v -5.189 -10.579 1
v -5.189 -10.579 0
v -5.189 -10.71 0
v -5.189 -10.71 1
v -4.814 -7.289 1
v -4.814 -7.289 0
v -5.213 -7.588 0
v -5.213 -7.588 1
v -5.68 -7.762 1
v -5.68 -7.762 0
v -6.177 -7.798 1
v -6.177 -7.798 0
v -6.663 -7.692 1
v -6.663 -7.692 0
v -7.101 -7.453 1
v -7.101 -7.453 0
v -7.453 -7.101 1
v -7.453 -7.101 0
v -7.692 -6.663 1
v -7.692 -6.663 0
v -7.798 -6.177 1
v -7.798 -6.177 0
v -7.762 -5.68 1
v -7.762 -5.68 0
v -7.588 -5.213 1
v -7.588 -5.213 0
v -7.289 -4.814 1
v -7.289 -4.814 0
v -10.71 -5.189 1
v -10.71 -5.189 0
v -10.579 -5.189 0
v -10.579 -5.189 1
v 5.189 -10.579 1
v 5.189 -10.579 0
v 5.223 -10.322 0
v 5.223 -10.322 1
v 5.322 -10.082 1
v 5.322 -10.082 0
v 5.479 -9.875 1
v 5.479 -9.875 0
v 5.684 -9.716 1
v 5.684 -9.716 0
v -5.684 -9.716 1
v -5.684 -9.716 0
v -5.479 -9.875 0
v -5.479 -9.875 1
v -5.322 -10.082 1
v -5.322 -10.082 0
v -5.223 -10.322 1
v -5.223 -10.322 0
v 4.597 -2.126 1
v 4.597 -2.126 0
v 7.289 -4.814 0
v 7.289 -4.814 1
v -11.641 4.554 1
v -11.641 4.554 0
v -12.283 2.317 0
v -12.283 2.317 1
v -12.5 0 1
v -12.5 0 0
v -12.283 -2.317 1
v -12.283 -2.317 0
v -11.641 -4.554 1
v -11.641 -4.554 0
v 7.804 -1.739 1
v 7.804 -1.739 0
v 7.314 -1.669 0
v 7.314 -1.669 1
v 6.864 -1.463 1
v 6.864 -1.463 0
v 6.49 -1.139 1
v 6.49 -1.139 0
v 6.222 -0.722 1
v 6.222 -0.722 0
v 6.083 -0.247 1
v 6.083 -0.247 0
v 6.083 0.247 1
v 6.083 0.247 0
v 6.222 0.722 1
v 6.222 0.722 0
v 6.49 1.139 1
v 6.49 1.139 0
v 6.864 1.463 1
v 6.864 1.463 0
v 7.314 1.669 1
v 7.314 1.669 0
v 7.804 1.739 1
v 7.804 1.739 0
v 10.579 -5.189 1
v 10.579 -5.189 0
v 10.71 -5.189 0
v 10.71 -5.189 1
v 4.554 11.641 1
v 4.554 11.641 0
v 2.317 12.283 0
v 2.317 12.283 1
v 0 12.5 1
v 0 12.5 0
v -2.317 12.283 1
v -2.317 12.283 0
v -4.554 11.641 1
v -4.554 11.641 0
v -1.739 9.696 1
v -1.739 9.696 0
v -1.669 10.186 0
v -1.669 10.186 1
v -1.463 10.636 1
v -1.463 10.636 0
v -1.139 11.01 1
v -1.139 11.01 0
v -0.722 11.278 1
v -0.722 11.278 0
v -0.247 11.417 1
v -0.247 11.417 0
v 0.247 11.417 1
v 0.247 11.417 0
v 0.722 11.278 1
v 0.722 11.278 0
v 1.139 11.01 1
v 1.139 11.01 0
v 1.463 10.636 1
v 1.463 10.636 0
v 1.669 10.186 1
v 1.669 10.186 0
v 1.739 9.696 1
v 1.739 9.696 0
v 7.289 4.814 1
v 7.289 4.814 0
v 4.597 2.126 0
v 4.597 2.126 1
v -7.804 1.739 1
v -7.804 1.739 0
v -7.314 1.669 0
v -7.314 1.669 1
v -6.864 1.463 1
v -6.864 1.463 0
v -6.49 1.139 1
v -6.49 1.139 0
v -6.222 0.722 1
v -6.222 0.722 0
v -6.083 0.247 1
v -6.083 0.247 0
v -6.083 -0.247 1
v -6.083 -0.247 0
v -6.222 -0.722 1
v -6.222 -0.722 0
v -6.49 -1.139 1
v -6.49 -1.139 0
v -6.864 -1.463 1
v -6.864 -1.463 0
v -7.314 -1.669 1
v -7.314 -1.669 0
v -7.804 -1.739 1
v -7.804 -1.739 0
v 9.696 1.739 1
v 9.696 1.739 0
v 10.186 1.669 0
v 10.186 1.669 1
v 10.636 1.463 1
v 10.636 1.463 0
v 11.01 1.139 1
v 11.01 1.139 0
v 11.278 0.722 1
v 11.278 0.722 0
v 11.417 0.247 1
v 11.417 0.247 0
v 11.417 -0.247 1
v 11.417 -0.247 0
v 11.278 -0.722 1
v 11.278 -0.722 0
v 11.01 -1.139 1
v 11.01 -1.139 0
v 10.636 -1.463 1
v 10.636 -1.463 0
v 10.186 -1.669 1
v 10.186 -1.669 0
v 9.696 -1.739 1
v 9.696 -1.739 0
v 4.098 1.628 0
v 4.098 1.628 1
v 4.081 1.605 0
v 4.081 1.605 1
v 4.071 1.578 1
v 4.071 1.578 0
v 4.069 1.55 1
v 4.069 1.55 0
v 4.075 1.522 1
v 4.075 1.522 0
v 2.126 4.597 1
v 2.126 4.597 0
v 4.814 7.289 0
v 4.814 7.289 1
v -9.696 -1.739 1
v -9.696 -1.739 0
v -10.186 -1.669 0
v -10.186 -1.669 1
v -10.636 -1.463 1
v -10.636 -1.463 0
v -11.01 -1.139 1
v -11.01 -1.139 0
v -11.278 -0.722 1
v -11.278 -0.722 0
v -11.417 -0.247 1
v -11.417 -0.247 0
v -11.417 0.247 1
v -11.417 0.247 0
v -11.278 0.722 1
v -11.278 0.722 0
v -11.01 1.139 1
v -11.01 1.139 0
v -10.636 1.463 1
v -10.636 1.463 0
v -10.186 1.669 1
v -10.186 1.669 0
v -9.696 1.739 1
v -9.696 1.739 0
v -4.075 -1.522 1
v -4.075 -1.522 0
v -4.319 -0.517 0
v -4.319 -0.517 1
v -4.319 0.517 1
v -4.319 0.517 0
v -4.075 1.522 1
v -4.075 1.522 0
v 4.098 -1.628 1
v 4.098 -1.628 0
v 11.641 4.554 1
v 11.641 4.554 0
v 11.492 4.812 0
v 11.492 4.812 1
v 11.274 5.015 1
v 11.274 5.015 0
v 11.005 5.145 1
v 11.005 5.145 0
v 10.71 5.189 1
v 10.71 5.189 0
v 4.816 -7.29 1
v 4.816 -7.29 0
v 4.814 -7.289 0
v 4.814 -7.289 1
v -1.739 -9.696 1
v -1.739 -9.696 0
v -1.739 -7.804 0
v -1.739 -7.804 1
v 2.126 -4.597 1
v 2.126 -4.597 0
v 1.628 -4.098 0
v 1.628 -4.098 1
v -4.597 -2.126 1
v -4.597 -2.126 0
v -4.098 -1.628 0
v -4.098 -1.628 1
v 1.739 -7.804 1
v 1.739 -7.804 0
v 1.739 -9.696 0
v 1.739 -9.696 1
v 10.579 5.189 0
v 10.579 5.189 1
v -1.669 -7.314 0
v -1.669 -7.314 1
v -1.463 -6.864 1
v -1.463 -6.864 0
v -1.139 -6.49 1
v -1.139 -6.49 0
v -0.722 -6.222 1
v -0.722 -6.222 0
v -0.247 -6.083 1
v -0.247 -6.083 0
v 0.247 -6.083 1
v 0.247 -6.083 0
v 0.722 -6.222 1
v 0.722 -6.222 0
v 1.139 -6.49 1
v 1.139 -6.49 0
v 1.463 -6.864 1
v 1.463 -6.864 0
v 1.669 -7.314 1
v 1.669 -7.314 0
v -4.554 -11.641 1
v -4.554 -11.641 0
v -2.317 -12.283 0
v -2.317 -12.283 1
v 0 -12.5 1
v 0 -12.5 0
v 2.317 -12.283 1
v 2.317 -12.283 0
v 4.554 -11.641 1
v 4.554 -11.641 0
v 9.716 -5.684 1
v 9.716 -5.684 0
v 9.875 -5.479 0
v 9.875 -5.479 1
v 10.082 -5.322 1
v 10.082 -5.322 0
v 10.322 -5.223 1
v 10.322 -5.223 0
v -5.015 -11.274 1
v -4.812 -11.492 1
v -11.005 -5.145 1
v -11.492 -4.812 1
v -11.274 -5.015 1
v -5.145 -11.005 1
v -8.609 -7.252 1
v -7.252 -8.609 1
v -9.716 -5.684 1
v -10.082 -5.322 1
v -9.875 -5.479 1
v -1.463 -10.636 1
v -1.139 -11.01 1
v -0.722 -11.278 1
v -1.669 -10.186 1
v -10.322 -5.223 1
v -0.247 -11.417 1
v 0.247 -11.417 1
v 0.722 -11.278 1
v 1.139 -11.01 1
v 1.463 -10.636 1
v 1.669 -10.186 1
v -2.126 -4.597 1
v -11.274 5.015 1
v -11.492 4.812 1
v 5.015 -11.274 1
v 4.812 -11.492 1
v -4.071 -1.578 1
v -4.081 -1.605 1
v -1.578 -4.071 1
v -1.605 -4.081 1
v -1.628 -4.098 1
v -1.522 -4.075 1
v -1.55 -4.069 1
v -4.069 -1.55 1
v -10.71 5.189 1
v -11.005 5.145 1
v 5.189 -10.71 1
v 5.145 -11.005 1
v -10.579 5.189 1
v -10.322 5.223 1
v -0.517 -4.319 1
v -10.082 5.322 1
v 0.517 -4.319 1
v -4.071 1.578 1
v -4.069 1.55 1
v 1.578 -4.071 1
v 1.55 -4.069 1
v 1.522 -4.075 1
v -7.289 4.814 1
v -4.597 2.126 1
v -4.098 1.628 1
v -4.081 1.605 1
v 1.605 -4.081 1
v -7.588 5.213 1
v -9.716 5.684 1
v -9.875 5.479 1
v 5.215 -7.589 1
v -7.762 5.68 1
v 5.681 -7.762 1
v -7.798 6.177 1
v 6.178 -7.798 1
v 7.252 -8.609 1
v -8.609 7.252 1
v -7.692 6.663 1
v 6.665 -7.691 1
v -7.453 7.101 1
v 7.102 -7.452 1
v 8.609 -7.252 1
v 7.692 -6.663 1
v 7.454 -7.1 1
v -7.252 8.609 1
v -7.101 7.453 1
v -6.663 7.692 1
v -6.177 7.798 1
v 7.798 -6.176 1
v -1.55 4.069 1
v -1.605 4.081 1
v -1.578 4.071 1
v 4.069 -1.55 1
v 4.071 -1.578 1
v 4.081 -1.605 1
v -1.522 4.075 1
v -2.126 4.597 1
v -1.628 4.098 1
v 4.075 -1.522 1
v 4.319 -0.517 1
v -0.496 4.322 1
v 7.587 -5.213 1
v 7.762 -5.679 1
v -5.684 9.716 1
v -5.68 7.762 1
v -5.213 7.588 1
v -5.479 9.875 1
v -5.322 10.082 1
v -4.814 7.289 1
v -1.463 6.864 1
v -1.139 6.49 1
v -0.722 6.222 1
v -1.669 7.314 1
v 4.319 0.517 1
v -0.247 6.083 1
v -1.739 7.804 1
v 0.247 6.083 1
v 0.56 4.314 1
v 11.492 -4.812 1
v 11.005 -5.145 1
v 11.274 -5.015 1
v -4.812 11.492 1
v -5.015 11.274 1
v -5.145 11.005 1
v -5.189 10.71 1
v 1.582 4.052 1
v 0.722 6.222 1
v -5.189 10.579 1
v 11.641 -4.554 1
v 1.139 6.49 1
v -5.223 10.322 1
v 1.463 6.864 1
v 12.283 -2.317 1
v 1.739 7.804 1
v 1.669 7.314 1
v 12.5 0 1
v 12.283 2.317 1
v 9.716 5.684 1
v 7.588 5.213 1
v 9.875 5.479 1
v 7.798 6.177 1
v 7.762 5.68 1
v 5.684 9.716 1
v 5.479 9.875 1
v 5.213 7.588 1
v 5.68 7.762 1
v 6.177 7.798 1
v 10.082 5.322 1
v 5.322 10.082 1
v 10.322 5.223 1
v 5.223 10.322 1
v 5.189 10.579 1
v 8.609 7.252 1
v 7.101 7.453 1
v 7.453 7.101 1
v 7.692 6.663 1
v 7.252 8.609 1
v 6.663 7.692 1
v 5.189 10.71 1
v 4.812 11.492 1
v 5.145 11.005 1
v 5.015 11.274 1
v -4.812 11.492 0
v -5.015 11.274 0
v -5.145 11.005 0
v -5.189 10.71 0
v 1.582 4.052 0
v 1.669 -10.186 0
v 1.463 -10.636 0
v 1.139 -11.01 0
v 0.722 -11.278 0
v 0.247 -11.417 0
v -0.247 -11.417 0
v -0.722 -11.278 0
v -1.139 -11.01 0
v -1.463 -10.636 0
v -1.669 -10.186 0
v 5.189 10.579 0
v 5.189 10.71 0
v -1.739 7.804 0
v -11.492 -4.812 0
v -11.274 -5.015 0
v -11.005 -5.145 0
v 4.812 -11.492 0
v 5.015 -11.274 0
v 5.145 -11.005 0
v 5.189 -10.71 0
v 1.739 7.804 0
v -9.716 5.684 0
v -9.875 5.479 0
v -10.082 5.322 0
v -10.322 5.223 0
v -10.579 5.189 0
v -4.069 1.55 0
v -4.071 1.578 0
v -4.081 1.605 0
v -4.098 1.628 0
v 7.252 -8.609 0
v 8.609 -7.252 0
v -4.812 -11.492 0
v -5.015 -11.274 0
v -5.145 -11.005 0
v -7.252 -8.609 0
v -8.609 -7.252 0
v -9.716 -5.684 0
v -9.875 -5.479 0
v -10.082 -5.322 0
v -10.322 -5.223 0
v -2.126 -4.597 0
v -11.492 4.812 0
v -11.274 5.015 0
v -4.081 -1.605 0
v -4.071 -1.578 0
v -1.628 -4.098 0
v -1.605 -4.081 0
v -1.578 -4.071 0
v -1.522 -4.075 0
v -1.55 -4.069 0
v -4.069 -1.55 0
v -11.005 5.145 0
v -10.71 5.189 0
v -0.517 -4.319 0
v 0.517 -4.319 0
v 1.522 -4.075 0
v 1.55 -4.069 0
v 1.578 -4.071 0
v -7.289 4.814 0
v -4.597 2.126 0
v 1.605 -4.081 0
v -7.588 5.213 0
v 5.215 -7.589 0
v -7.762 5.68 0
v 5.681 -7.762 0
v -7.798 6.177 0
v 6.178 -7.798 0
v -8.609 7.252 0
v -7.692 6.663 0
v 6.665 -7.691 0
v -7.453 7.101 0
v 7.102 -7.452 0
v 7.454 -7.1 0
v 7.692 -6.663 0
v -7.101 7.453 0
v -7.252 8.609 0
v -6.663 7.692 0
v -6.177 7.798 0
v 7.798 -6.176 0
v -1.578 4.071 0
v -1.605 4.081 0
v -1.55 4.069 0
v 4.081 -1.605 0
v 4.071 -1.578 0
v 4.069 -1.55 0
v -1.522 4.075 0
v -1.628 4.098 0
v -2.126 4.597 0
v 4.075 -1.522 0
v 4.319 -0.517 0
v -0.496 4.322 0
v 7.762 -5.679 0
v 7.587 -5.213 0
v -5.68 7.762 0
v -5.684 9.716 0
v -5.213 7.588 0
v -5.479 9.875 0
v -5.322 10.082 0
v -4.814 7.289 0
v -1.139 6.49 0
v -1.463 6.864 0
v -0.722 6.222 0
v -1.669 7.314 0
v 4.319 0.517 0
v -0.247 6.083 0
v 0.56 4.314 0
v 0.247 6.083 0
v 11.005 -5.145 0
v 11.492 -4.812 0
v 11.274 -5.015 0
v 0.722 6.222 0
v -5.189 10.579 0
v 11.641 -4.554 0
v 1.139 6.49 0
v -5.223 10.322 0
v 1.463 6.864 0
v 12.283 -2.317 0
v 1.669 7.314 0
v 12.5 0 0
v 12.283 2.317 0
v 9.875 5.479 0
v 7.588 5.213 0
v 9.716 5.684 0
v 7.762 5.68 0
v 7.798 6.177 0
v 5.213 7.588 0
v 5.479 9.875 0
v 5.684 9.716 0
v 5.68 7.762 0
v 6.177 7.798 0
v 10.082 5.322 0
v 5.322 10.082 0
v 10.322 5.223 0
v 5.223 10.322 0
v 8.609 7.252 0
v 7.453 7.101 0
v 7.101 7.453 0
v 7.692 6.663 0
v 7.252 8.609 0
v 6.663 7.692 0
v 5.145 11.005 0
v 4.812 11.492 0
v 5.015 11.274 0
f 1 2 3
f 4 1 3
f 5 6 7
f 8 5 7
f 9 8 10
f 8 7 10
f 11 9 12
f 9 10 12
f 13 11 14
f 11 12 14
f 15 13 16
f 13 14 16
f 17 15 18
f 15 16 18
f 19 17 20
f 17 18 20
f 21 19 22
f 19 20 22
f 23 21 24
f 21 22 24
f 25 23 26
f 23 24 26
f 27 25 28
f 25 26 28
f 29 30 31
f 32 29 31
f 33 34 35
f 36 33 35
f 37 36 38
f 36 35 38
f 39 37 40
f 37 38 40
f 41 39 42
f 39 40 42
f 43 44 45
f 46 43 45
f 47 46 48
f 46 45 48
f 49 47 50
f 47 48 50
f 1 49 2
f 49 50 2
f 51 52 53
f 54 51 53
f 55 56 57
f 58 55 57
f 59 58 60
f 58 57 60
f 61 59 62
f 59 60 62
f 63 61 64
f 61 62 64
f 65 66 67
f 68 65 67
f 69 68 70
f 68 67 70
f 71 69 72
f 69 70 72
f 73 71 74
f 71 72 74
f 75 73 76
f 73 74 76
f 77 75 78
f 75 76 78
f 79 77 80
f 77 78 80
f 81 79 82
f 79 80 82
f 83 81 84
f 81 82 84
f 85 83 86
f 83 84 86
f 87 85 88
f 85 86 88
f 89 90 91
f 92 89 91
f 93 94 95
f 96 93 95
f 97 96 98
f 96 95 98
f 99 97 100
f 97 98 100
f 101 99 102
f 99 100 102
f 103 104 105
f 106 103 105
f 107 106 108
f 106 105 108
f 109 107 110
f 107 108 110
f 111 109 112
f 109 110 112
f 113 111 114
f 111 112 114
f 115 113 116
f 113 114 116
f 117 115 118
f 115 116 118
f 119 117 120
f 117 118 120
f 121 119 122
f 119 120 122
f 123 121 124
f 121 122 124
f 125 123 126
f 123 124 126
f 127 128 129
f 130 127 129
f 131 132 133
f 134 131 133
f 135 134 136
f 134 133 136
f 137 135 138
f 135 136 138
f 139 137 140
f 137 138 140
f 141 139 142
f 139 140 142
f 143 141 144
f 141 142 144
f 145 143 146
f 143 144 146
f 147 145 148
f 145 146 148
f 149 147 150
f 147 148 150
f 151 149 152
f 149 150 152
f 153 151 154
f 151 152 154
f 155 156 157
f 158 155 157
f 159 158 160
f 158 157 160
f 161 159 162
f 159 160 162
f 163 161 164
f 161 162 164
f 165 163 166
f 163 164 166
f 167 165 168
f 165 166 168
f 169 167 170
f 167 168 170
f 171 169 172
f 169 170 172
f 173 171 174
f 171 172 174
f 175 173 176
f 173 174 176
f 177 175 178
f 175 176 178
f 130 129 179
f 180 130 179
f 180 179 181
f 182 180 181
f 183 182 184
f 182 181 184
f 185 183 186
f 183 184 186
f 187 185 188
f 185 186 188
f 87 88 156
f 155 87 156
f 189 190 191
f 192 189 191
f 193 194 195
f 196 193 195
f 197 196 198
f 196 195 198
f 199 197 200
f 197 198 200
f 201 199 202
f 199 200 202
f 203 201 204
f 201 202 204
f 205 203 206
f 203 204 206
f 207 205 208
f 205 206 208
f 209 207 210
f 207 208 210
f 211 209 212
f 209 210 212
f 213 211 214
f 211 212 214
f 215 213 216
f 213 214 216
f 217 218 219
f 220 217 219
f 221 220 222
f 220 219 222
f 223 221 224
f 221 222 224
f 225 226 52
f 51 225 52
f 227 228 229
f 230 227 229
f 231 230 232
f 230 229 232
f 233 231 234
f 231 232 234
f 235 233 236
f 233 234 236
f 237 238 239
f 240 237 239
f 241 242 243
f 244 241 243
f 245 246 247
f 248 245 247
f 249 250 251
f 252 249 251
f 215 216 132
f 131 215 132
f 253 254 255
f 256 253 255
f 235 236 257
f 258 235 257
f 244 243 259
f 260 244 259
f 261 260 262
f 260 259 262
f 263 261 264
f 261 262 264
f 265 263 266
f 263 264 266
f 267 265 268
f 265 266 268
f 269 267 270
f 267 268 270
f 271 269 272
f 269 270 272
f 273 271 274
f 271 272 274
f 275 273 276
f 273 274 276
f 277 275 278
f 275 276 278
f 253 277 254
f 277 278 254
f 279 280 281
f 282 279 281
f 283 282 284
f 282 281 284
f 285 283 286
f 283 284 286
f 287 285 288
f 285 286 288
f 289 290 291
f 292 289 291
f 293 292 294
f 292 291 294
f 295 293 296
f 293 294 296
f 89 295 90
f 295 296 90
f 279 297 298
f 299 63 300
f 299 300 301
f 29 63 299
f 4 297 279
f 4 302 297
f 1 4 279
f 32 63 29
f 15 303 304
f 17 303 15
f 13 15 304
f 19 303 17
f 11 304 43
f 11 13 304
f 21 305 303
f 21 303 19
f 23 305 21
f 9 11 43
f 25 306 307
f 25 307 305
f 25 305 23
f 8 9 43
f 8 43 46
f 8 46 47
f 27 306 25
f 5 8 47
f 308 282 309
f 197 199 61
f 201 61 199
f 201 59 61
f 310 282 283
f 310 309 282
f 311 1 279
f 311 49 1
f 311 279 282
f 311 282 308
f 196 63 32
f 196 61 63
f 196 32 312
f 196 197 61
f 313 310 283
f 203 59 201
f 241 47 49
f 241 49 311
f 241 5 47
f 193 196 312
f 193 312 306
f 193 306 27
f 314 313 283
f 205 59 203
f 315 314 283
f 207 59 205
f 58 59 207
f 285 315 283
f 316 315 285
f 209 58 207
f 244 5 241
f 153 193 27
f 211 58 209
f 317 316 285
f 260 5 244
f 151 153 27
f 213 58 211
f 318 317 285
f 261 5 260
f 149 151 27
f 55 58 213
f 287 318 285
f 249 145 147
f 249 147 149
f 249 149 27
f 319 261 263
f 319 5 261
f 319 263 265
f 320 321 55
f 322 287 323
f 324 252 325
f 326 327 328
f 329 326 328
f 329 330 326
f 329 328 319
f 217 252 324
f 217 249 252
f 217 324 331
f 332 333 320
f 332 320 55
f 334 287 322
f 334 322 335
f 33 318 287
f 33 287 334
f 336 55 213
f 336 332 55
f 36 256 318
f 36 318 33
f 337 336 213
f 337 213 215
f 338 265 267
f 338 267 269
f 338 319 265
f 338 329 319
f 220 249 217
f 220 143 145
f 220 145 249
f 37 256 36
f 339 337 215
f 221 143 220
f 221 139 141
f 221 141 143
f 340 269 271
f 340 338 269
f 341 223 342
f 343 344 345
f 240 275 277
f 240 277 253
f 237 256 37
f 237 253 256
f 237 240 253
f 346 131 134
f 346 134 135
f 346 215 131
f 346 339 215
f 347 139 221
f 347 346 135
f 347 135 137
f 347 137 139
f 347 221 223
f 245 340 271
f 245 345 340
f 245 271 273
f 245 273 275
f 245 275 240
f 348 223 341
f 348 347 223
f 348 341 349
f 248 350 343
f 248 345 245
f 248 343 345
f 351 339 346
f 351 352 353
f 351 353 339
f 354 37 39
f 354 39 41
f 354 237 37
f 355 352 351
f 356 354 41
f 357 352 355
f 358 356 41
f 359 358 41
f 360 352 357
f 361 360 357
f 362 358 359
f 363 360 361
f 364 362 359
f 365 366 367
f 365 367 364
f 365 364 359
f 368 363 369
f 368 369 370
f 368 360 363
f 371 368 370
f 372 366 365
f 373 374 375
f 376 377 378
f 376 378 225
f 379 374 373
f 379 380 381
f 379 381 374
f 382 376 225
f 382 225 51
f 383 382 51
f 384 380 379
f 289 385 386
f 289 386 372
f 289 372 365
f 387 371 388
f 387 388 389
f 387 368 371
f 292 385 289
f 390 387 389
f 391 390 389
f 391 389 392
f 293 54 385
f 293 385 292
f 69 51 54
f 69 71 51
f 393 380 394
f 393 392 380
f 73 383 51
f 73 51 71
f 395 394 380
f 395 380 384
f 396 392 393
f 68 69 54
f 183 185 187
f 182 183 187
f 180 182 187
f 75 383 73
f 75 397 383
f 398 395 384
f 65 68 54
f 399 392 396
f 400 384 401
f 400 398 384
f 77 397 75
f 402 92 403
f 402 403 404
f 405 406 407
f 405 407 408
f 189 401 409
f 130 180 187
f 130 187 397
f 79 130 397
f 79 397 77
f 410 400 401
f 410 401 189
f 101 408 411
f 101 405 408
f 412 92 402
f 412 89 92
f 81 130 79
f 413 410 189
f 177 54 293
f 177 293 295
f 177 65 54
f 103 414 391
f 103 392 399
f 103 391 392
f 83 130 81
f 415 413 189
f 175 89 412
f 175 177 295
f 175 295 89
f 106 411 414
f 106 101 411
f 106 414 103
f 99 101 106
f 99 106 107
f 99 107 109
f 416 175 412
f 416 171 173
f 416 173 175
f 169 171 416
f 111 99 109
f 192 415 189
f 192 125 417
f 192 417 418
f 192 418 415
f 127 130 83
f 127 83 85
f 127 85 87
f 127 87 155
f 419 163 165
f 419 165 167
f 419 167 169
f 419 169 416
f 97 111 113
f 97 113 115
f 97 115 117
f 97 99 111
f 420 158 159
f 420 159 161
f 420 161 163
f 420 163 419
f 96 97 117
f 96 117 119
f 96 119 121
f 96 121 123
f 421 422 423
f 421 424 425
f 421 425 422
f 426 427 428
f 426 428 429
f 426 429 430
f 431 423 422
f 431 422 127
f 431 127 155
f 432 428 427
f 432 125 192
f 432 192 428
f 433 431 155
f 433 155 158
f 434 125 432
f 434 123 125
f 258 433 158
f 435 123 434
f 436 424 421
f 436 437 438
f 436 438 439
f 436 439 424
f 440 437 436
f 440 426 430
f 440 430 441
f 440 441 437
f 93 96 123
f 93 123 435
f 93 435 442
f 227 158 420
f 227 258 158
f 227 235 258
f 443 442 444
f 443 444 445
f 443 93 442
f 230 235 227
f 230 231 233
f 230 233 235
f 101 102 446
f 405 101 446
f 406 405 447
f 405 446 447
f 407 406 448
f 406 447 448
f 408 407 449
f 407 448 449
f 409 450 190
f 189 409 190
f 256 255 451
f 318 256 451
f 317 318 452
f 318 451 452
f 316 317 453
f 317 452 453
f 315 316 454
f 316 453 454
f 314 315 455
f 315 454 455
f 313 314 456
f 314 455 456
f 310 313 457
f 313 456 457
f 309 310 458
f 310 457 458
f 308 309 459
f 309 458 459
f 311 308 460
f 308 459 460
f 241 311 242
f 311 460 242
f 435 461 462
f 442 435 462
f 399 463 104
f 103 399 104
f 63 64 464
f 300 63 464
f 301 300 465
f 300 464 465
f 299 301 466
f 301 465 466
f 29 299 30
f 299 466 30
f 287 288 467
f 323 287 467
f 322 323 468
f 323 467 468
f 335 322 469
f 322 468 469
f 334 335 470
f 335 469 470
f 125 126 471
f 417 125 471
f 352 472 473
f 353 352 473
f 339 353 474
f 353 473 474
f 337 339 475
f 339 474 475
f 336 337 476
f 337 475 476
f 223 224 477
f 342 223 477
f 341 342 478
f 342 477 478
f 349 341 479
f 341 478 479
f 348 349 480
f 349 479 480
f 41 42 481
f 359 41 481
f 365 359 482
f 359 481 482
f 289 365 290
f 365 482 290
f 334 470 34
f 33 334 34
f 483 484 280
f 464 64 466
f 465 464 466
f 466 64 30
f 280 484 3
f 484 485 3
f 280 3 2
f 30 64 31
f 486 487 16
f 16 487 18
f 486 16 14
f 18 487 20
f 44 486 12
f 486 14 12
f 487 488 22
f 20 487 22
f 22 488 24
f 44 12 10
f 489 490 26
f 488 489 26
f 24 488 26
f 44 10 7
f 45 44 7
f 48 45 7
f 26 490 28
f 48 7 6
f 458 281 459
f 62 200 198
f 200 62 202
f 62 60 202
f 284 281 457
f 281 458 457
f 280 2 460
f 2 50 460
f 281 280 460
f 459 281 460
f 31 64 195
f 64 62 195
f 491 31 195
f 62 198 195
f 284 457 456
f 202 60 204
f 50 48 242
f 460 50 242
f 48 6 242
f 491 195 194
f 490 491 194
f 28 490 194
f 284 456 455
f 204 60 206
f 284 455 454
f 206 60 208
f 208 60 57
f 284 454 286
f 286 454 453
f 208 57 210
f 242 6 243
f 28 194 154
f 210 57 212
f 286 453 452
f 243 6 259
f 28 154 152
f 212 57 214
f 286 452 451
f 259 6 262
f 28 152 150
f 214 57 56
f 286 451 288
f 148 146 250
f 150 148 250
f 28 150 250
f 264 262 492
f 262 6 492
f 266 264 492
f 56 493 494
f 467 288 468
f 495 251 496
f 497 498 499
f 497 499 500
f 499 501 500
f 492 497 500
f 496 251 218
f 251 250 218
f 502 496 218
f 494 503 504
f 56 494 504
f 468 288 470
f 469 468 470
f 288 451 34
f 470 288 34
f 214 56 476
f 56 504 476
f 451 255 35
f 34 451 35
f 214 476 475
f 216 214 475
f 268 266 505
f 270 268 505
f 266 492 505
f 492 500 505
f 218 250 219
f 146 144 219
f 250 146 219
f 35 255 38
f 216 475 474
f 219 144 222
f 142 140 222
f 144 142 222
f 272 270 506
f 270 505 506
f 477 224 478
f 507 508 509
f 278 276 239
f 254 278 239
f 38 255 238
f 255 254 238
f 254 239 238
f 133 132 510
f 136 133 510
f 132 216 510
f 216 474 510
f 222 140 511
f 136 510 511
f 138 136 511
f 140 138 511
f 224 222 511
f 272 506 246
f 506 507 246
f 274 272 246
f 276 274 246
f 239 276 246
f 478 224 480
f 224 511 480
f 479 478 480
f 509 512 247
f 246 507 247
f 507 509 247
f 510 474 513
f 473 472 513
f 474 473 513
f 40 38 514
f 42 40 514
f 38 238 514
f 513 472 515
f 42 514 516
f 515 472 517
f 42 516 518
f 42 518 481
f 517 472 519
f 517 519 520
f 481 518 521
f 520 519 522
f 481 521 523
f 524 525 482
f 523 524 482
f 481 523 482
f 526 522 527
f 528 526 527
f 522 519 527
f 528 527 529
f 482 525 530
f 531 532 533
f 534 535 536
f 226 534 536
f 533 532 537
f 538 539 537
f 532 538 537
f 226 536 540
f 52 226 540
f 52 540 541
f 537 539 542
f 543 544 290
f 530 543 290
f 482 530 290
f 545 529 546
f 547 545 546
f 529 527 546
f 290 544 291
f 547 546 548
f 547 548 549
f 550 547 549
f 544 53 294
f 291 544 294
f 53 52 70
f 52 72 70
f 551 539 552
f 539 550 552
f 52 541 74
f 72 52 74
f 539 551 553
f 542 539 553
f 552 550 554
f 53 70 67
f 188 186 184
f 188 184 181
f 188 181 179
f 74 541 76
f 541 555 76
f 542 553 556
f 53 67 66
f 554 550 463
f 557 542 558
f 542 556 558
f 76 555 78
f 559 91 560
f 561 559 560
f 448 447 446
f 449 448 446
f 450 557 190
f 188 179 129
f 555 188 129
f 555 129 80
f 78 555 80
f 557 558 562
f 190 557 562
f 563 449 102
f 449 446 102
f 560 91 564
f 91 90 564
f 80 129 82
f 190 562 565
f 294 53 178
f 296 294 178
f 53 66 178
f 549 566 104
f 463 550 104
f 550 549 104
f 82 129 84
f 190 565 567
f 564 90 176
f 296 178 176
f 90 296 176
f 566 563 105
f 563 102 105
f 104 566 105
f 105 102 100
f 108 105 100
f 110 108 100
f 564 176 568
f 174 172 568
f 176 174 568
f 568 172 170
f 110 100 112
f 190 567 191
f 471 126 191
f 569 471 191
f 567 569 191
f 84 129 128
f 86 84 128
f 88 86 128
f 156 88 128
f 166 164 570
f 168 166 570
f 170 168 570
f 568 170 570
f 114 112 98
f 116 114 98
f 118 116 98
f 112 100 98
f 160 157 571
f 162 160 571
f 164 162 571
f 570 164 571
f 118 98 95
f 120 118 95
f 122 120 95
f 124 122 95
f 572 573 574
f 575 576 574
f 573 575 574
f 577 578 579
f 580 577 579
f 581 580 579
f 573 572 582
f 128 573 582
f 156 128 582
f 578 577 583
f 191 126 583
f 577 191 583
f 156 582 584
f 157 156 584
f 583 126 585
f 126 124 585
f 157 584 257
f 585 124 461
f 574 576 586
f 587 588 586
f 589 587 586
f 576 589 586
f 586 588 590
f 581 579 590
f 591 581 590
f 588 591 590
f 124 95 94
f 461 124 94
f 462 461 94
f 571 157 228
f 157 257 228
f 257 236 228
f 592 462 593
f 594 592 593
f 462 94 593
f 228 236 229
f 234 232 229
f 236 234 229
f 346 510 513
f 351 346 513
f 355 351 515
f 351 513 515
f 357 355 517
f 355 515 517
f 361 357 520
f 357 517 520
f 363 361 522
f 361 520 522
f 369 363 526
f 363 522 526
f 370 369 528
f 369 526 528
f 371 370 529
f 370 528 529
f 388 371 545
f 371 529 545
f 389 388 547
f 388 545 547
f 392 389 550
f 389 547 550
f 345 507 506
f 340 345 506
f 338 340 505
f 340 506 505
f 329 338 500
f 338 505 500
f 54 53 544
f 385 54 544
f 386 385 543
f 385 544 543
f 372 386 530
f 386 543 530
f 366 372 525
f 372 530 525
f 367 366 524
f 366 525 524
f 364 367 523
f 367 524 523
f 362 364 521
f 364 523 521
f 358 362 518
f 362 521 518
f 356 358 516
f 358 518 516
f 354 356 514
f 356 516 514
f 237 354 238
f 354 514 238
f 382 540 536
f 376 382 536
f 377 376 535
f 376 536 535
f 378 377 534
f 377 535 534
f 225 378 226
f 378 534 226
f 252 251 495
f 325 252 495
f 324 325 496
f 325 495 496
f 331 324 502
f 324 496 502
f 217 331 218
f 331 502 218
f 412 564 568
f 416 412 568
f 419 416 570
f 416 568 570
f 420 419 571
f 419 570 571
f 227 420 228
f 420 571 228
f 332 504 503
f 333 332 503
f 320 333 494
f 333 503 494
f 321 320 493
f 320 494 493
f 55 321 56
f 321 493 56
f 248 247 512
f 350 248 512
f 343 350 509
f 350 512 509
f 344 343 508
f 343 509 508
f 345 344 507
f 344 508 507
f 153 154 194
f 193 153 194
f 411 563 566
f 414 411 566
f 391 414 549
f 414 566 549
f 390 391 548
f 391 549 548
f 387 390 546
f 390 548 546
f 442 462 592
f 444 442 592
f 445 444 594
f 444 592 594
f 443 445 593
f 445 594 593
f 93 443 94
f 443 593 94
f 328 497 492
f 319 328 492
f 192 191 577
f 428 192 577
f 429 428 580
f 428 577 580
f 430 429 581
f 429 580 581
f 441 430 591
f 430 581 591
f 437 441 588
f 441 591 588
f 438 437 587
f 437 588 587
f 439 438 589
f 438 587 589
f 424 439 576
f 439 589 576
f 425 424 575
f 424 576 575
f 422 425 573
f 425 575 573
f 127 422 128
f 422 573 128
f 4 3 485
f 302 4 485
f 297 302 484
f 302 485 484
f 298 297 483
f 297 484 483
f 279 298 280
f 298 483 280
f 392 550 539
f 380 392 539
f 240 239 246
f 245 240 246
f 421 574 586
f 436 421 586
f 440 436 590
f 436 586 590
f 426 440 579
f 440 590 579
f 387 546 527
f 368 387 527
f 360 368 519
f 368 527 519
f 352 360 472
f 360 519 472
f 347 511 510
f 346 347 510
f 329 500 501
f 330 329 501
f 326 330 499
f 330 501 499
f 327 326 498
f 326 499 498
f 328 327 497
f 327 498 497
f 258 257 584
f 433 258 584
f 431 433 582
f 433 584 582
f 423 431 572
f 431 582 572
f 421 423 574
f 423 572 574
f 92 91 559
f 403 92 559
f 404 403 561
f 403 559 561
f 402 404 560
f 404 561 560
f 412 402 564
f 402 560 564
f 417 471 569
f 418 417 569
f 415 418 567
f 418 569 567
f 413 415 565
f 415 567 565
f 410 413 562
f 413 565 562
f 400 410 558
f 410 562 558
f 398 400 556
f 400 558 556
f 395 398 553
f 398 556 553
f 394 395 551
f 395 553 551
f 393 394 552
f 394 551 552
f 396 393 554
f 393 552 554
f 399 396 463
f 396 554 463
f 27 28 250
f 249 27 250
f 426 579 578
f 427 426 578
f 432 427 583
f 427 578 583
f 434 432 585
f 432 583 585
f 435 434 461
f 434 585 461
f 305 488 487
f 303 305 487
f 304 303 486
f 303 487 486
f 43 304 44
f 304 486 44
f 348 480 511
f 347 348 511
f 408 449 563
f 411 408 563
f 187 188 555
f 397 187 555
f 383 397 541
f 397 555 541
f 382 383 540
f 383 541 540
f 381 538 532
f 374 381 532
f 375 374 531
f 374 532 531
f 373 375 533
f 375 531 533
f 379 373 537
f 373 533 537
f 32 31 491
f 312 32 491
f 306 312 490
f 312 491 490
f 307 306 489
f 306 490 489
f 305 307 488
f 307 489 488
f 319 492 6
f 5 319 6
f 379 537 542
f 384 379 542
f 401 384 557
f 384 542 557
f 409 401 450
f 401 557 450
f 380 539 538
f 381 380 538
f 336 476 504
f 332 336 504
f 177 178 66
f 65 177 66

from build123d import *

# Parameters (mm, degrees)
F1_DEPTH = 1


# Not quite as in the source:
# - ends of sketch curves that miss each other by under 0.0002 mm in the source are joined


with BuildPart() as f1:
    # F0 (on Top) → F1 (new body)
    with BuildSketch(Plane.XY):
        with BuildLine():
            ThreePointArc((5.1893277963, 10.709786768), (5.015248305, 11.2735733528), (4.5536171698, 11.6410725739))
            ThreePointArc((4.5536171698, 11.6410725739), (0, 12.5), (-4.5536171698, 11.6410725739))
            ThreePointArc((-4.5536171698, 11.6410725739), (-5.015248305, 11.2735733528), (-5.1893277963, 10.709786768))
            Line((-5.1893277963, 10.709786768), (-5.1893277963, 10.5791593824))
            ThreePointArc((-5.1893277963, 10.5791593824), (-5.3218672589, 10.0816533863), (-5.6843522286, 9.716025745))
            ThreePointArc((-5.6843522286, 9.716025745), (-7.9596801612, 7.9596801612), (-9.716025745, 5.6843522286))
            ThreePointArc((-9.716025745, 5.6843522286), (-10.0816533863, 5.3218672589), (-10.5791593824, 5.1893277963))
            Line((-10.5791593824, 5.1893277963), (-10.709786768, 5.1893277963))
            ThreePointArc((-10.709786768, 5.1893277963), (-11.2735733528, 5.015248305), (-11.6410725739, 4.5536171698))
            ThreePointArc((-11.6410725739, 4.5536171698), (-12.5, 0), (-11.6410725739, -4.5536171698))
            ThreePointArc((-11.6410725739, -4.5536171698), (-11.2735733528, -5.015248305), (-10.709786768, -5.1893277963))
            Line((-10.709786768, -5.1893277963), (-10.5791593824, -5.1893277963))
            ThreePointArc((-10.5791593824, -5.1893277963), (-10.0816533863, -5.3218672589), (-9.716025745, -5.6843522286))
            ThreePointArc((-9.716025745, -5.6843522286), (-7.9596801612, -7.9596801612), (-5.6843522286, -9.716025745))
            ThreePointArc((-5.6843522286, -9.716025745), (-5.3218672589, -10.0816533863), (-5.1893277963, -10.5791593824))
            Line((-5.1893277963, -10.5791593824), (-5.1893277963, -10.709786768))
            ThreePointArc((-5.1893277963, -10.709786768), (-5.015248305, -11.2735733528), (-4.5536171698, -11.6410725739))
            ThreePointArc((-4.5536171698, -11.6410725739), (0, -12.5), (4.5536171698, -11.6410725739))
            ThreePointArc((4.5536171698, -11.6410725739), (5.015248305, -11.2735733528), (5.1893277963, -10.709786768))
            Line((5.1893277963, -10.709786768), (5.1893277963, -10.5791593824))
            ThreePointArc((5.1893277963, -10.5791593824), (5.3218672589, -10.0816533863), (5.6843522286, -9.716025745))
            ThreePointArc((5.6843522286, -9.716025745), (7.9596801612, -7.9596801612), (9.716025745, -5.6843522286))
            ThreePointArc((9.716025745, -5.6843522286), (10.0816533863, -5.3218672589), (10.5791593824, -5.1893277963))
            Line((10.5791593824, -5.1893277963), (10.709786768, -5.1893277963))
            ThreePointArc((10.709786768, -5.1893277963), (11.2735733528, -5.015248305), (11.6410725739, -4.5536171698))
            ThreePointArc((11.6410725739, -4.5536171698), (12.5, 0), (11.6410725739, 4.5536171698))
            ThreePointArc((11.6410725739, 4.5536171698), (11.2735733528, 5.015248305), (10.709786768, 5.1893277963))
            Line((10.709786768, 5.1893277963), (10.5791593824, 5.1893277963))
            ThreePointArc((10.5791593824, 5.1893277963), (10.0816533863, 5.3218672589), (9.716025745, 5.6843522286))
            ThreePointArc((9.716025745, 5.6843522286), (7.9596801612, 7.9596801612), (5.6843522286, 9.716025745))
            ThreePointArc((5.6843522286, 9.716025745), (5.3218672589, 10.0816533863), (5.1893277963, 10.5791593824))
            Line((5.1893277963, 10.5791593824), (5.1893277963, 10.709786768))
        make_face()
        with BuildLine():
            Line((-1.7389636828, -9.696227699), (-1.7389636828, -7.803772301))
            ThreePointArc((-1.7389636828, -7.803772301), (0, -6.0648086182), (1.7389636828, -7.803772301))
            Line((1.7389636828, -7.803772301), (1.7389636828, -9.696227699))
            ThreePointArc((1.7389636828, -9.696227699), (0, -11.4351913818), (-1.7389636828, -9.696227699))
        make_face(mode=Mode.SUBTRACT)
        with BuildLine():
            Line((-4.0980324058, 1.6278386791), (-4.596886989, 2.1259958547))
            Line((-4.596886989, 2.1259958547), (-7.2887076389, 4.8140532918))
            ThreePointArc((-7.2887076389, 4.8140532918), (-7.2895746597, 7.2895734489), (-4.8140532909, 7.2887076381))
            Line((-4.8140532909, 7.2887076381), (-2.1259958547, 4.596886989))
            Line((-2.1259958547, 4.596886989), (-1.6278386791, 4.0980324058))
            ThreePointArc((-1.6278386791, 4.0980324058), (-1.5783462567, 4.0709813489), (-1.5220880269, 4.0750150967))
            ThreePointArc((-1.5220880269, 4.0750150967), (0.0320676528, 4.349881799), (1.5820019575, 4.052131514))
            Line((1.5820019575, 4.052131514), (2.1259958547, 4.596886989))
            Line((2.1259958547, 4.596886989), (4.8140532909, 7.2887076381))
            ThreePointArc((4.8140532909, 7.2887076381), (7.2895746597, 7.2895734489), (7.2887088489, 4.8140520801))
            Line((7.2887088489, 4.8140520801), (4.596886989, 2.1259958547))
            Line((4.596886989, 2.1259958547), (4.0980324058, 1.6278386791))
            ThreePointArc((4.0980324058, 1.6278386791), (4.0709813489, 1.5783462567), (4.0750150967, 1.5220880269))
            ThreePointArc((4.0750150967, 1.5220880269), (4.35, 0), (4.0750150967, -1.5220880269))
            ThreePointArc((4.0750150967, -1.5220880269), (4.0709813489, -1.5783462567), (4.0980324058, -1.6278386791))
            Line((4.0980324058, -1.6278386791), (4.596886989, -2.1259958547))
            Line((4.596886989, -2.1259958547), (7.2887076389, -4.8140532918))
            ThreePointArc((7.2887076389, -4.8140532918), (7.2904398646, -7.2887076385), (4.8157843062, -7.2904386534))
            Line((4.8157843062, -7.2904386534), (4.8140532909, -7.2887076381))
            Line((4.8140532909, -7.2887076381), (2.1259958547, -4.596886989))
            Line((2.1259958547, -4.596886989), (1.6278386791, -4.0980324058))
            ThreePointArc((1.6278386791, -4.0980324058), (1.5783462567, -4.0709813489), (1.5220880269, -4.0750150967))
            ThreePointArc((1.5220880269, -4.0750150967), (0, -4.35), (-1.5220880269, -4.0750150967))
            ThreePointArc((-1.5220880269, -4.0750150967), (-1.5783462567, -4.0709813489), (-1.6278386791, -4.0980324058))
            Line((-1.6278386791, -4.0980324058), (-2.1259958547, -4.596886989))
            Line((-2.1259958547, -4.596886989), (-4.8140532909, -7.2887076381))
            ThreePointArc((-4.8140532909, -7.2887076381), (-7.2895746597, -7.2895734489), (-7.2887088489, -4.8140520801))
            Line((-7.2887088489, -4.8140520801), (-4.596886989, -2.1259958547))
            Line((-4.596886989, -2.1259958547), (-4.0980324058, -1.6278386791))
            ThreePointArc((-4.0980324058, -1.6278386791), (-4.0709813489, -1.5783462567), (-4.0750150967, -1.5220880269))
            ThreePointArc((-4.0750150967, -1.5220880269), (-4.35, 0), (-4.0750150967, 1.5220880269))
            ThreePointArc((-4.0750150967, 1.5220880269), (-4.0709813489, 1.5783462567), (-4.0980324058, 1.6278386791))
        make_face(mode=Mode.SUBTRACT)
        with BuildLine():
            Line((-7.803772301, -1.7389636828), (-9.696227699, -1.7389636828))
            ThreePointArc((-9.696227699, -1.7389636828), (-11.4351913818, 0), (-9.696227699, 1.7389636828))
            Line((-9.696227699, 1.7389636828), (-7.803772301, 1.7389636828))
            ThreePointArc((-7.803772301, 1.7389636828), (-6.0648086182, 0), (-7.803772301, -1.7389636828))
        make_face(mode=Mode.SUBTRACT)
        with BuildLine():
            Line((9.696227699, -1.7389636828), (7.803772301, -1.7389636828))
            ThreePointArc((7.803772301, -1.7389636828), (6.0648086182, 0), (7.803772301, 1.7389636828))
            Line((7.803772301, 1.7389636828), (9.696227699, 1.7389636828))
            ThreePointArc((9.696227699, 1.7389636828), (11.4351913818, 0), (9.696227699, -1.7389636828))
        make_face(mode=Mode.SUBTRACT)
        with BuildLine():
            Line((1.7389636828, 9.696227699), (1.7389636828, 7.803772301))
            ThreePointArc((1.7389636828, 7.803772301), (0, 6.0648086182), (-1.7389636828, 7.803772301))
            Line((-1.7389636828, 7.803772301), (-1.7389636828, 9.696227699))
            ThreePointArc((-1.7389636828, 9.696227699), (0, 11.4351913818), (1.7389636828, 9.696227699))
        make_face(mode=Mode.SUBTRACT)
    extrude(amount=F1_DEPTH)


solid = f1.part
